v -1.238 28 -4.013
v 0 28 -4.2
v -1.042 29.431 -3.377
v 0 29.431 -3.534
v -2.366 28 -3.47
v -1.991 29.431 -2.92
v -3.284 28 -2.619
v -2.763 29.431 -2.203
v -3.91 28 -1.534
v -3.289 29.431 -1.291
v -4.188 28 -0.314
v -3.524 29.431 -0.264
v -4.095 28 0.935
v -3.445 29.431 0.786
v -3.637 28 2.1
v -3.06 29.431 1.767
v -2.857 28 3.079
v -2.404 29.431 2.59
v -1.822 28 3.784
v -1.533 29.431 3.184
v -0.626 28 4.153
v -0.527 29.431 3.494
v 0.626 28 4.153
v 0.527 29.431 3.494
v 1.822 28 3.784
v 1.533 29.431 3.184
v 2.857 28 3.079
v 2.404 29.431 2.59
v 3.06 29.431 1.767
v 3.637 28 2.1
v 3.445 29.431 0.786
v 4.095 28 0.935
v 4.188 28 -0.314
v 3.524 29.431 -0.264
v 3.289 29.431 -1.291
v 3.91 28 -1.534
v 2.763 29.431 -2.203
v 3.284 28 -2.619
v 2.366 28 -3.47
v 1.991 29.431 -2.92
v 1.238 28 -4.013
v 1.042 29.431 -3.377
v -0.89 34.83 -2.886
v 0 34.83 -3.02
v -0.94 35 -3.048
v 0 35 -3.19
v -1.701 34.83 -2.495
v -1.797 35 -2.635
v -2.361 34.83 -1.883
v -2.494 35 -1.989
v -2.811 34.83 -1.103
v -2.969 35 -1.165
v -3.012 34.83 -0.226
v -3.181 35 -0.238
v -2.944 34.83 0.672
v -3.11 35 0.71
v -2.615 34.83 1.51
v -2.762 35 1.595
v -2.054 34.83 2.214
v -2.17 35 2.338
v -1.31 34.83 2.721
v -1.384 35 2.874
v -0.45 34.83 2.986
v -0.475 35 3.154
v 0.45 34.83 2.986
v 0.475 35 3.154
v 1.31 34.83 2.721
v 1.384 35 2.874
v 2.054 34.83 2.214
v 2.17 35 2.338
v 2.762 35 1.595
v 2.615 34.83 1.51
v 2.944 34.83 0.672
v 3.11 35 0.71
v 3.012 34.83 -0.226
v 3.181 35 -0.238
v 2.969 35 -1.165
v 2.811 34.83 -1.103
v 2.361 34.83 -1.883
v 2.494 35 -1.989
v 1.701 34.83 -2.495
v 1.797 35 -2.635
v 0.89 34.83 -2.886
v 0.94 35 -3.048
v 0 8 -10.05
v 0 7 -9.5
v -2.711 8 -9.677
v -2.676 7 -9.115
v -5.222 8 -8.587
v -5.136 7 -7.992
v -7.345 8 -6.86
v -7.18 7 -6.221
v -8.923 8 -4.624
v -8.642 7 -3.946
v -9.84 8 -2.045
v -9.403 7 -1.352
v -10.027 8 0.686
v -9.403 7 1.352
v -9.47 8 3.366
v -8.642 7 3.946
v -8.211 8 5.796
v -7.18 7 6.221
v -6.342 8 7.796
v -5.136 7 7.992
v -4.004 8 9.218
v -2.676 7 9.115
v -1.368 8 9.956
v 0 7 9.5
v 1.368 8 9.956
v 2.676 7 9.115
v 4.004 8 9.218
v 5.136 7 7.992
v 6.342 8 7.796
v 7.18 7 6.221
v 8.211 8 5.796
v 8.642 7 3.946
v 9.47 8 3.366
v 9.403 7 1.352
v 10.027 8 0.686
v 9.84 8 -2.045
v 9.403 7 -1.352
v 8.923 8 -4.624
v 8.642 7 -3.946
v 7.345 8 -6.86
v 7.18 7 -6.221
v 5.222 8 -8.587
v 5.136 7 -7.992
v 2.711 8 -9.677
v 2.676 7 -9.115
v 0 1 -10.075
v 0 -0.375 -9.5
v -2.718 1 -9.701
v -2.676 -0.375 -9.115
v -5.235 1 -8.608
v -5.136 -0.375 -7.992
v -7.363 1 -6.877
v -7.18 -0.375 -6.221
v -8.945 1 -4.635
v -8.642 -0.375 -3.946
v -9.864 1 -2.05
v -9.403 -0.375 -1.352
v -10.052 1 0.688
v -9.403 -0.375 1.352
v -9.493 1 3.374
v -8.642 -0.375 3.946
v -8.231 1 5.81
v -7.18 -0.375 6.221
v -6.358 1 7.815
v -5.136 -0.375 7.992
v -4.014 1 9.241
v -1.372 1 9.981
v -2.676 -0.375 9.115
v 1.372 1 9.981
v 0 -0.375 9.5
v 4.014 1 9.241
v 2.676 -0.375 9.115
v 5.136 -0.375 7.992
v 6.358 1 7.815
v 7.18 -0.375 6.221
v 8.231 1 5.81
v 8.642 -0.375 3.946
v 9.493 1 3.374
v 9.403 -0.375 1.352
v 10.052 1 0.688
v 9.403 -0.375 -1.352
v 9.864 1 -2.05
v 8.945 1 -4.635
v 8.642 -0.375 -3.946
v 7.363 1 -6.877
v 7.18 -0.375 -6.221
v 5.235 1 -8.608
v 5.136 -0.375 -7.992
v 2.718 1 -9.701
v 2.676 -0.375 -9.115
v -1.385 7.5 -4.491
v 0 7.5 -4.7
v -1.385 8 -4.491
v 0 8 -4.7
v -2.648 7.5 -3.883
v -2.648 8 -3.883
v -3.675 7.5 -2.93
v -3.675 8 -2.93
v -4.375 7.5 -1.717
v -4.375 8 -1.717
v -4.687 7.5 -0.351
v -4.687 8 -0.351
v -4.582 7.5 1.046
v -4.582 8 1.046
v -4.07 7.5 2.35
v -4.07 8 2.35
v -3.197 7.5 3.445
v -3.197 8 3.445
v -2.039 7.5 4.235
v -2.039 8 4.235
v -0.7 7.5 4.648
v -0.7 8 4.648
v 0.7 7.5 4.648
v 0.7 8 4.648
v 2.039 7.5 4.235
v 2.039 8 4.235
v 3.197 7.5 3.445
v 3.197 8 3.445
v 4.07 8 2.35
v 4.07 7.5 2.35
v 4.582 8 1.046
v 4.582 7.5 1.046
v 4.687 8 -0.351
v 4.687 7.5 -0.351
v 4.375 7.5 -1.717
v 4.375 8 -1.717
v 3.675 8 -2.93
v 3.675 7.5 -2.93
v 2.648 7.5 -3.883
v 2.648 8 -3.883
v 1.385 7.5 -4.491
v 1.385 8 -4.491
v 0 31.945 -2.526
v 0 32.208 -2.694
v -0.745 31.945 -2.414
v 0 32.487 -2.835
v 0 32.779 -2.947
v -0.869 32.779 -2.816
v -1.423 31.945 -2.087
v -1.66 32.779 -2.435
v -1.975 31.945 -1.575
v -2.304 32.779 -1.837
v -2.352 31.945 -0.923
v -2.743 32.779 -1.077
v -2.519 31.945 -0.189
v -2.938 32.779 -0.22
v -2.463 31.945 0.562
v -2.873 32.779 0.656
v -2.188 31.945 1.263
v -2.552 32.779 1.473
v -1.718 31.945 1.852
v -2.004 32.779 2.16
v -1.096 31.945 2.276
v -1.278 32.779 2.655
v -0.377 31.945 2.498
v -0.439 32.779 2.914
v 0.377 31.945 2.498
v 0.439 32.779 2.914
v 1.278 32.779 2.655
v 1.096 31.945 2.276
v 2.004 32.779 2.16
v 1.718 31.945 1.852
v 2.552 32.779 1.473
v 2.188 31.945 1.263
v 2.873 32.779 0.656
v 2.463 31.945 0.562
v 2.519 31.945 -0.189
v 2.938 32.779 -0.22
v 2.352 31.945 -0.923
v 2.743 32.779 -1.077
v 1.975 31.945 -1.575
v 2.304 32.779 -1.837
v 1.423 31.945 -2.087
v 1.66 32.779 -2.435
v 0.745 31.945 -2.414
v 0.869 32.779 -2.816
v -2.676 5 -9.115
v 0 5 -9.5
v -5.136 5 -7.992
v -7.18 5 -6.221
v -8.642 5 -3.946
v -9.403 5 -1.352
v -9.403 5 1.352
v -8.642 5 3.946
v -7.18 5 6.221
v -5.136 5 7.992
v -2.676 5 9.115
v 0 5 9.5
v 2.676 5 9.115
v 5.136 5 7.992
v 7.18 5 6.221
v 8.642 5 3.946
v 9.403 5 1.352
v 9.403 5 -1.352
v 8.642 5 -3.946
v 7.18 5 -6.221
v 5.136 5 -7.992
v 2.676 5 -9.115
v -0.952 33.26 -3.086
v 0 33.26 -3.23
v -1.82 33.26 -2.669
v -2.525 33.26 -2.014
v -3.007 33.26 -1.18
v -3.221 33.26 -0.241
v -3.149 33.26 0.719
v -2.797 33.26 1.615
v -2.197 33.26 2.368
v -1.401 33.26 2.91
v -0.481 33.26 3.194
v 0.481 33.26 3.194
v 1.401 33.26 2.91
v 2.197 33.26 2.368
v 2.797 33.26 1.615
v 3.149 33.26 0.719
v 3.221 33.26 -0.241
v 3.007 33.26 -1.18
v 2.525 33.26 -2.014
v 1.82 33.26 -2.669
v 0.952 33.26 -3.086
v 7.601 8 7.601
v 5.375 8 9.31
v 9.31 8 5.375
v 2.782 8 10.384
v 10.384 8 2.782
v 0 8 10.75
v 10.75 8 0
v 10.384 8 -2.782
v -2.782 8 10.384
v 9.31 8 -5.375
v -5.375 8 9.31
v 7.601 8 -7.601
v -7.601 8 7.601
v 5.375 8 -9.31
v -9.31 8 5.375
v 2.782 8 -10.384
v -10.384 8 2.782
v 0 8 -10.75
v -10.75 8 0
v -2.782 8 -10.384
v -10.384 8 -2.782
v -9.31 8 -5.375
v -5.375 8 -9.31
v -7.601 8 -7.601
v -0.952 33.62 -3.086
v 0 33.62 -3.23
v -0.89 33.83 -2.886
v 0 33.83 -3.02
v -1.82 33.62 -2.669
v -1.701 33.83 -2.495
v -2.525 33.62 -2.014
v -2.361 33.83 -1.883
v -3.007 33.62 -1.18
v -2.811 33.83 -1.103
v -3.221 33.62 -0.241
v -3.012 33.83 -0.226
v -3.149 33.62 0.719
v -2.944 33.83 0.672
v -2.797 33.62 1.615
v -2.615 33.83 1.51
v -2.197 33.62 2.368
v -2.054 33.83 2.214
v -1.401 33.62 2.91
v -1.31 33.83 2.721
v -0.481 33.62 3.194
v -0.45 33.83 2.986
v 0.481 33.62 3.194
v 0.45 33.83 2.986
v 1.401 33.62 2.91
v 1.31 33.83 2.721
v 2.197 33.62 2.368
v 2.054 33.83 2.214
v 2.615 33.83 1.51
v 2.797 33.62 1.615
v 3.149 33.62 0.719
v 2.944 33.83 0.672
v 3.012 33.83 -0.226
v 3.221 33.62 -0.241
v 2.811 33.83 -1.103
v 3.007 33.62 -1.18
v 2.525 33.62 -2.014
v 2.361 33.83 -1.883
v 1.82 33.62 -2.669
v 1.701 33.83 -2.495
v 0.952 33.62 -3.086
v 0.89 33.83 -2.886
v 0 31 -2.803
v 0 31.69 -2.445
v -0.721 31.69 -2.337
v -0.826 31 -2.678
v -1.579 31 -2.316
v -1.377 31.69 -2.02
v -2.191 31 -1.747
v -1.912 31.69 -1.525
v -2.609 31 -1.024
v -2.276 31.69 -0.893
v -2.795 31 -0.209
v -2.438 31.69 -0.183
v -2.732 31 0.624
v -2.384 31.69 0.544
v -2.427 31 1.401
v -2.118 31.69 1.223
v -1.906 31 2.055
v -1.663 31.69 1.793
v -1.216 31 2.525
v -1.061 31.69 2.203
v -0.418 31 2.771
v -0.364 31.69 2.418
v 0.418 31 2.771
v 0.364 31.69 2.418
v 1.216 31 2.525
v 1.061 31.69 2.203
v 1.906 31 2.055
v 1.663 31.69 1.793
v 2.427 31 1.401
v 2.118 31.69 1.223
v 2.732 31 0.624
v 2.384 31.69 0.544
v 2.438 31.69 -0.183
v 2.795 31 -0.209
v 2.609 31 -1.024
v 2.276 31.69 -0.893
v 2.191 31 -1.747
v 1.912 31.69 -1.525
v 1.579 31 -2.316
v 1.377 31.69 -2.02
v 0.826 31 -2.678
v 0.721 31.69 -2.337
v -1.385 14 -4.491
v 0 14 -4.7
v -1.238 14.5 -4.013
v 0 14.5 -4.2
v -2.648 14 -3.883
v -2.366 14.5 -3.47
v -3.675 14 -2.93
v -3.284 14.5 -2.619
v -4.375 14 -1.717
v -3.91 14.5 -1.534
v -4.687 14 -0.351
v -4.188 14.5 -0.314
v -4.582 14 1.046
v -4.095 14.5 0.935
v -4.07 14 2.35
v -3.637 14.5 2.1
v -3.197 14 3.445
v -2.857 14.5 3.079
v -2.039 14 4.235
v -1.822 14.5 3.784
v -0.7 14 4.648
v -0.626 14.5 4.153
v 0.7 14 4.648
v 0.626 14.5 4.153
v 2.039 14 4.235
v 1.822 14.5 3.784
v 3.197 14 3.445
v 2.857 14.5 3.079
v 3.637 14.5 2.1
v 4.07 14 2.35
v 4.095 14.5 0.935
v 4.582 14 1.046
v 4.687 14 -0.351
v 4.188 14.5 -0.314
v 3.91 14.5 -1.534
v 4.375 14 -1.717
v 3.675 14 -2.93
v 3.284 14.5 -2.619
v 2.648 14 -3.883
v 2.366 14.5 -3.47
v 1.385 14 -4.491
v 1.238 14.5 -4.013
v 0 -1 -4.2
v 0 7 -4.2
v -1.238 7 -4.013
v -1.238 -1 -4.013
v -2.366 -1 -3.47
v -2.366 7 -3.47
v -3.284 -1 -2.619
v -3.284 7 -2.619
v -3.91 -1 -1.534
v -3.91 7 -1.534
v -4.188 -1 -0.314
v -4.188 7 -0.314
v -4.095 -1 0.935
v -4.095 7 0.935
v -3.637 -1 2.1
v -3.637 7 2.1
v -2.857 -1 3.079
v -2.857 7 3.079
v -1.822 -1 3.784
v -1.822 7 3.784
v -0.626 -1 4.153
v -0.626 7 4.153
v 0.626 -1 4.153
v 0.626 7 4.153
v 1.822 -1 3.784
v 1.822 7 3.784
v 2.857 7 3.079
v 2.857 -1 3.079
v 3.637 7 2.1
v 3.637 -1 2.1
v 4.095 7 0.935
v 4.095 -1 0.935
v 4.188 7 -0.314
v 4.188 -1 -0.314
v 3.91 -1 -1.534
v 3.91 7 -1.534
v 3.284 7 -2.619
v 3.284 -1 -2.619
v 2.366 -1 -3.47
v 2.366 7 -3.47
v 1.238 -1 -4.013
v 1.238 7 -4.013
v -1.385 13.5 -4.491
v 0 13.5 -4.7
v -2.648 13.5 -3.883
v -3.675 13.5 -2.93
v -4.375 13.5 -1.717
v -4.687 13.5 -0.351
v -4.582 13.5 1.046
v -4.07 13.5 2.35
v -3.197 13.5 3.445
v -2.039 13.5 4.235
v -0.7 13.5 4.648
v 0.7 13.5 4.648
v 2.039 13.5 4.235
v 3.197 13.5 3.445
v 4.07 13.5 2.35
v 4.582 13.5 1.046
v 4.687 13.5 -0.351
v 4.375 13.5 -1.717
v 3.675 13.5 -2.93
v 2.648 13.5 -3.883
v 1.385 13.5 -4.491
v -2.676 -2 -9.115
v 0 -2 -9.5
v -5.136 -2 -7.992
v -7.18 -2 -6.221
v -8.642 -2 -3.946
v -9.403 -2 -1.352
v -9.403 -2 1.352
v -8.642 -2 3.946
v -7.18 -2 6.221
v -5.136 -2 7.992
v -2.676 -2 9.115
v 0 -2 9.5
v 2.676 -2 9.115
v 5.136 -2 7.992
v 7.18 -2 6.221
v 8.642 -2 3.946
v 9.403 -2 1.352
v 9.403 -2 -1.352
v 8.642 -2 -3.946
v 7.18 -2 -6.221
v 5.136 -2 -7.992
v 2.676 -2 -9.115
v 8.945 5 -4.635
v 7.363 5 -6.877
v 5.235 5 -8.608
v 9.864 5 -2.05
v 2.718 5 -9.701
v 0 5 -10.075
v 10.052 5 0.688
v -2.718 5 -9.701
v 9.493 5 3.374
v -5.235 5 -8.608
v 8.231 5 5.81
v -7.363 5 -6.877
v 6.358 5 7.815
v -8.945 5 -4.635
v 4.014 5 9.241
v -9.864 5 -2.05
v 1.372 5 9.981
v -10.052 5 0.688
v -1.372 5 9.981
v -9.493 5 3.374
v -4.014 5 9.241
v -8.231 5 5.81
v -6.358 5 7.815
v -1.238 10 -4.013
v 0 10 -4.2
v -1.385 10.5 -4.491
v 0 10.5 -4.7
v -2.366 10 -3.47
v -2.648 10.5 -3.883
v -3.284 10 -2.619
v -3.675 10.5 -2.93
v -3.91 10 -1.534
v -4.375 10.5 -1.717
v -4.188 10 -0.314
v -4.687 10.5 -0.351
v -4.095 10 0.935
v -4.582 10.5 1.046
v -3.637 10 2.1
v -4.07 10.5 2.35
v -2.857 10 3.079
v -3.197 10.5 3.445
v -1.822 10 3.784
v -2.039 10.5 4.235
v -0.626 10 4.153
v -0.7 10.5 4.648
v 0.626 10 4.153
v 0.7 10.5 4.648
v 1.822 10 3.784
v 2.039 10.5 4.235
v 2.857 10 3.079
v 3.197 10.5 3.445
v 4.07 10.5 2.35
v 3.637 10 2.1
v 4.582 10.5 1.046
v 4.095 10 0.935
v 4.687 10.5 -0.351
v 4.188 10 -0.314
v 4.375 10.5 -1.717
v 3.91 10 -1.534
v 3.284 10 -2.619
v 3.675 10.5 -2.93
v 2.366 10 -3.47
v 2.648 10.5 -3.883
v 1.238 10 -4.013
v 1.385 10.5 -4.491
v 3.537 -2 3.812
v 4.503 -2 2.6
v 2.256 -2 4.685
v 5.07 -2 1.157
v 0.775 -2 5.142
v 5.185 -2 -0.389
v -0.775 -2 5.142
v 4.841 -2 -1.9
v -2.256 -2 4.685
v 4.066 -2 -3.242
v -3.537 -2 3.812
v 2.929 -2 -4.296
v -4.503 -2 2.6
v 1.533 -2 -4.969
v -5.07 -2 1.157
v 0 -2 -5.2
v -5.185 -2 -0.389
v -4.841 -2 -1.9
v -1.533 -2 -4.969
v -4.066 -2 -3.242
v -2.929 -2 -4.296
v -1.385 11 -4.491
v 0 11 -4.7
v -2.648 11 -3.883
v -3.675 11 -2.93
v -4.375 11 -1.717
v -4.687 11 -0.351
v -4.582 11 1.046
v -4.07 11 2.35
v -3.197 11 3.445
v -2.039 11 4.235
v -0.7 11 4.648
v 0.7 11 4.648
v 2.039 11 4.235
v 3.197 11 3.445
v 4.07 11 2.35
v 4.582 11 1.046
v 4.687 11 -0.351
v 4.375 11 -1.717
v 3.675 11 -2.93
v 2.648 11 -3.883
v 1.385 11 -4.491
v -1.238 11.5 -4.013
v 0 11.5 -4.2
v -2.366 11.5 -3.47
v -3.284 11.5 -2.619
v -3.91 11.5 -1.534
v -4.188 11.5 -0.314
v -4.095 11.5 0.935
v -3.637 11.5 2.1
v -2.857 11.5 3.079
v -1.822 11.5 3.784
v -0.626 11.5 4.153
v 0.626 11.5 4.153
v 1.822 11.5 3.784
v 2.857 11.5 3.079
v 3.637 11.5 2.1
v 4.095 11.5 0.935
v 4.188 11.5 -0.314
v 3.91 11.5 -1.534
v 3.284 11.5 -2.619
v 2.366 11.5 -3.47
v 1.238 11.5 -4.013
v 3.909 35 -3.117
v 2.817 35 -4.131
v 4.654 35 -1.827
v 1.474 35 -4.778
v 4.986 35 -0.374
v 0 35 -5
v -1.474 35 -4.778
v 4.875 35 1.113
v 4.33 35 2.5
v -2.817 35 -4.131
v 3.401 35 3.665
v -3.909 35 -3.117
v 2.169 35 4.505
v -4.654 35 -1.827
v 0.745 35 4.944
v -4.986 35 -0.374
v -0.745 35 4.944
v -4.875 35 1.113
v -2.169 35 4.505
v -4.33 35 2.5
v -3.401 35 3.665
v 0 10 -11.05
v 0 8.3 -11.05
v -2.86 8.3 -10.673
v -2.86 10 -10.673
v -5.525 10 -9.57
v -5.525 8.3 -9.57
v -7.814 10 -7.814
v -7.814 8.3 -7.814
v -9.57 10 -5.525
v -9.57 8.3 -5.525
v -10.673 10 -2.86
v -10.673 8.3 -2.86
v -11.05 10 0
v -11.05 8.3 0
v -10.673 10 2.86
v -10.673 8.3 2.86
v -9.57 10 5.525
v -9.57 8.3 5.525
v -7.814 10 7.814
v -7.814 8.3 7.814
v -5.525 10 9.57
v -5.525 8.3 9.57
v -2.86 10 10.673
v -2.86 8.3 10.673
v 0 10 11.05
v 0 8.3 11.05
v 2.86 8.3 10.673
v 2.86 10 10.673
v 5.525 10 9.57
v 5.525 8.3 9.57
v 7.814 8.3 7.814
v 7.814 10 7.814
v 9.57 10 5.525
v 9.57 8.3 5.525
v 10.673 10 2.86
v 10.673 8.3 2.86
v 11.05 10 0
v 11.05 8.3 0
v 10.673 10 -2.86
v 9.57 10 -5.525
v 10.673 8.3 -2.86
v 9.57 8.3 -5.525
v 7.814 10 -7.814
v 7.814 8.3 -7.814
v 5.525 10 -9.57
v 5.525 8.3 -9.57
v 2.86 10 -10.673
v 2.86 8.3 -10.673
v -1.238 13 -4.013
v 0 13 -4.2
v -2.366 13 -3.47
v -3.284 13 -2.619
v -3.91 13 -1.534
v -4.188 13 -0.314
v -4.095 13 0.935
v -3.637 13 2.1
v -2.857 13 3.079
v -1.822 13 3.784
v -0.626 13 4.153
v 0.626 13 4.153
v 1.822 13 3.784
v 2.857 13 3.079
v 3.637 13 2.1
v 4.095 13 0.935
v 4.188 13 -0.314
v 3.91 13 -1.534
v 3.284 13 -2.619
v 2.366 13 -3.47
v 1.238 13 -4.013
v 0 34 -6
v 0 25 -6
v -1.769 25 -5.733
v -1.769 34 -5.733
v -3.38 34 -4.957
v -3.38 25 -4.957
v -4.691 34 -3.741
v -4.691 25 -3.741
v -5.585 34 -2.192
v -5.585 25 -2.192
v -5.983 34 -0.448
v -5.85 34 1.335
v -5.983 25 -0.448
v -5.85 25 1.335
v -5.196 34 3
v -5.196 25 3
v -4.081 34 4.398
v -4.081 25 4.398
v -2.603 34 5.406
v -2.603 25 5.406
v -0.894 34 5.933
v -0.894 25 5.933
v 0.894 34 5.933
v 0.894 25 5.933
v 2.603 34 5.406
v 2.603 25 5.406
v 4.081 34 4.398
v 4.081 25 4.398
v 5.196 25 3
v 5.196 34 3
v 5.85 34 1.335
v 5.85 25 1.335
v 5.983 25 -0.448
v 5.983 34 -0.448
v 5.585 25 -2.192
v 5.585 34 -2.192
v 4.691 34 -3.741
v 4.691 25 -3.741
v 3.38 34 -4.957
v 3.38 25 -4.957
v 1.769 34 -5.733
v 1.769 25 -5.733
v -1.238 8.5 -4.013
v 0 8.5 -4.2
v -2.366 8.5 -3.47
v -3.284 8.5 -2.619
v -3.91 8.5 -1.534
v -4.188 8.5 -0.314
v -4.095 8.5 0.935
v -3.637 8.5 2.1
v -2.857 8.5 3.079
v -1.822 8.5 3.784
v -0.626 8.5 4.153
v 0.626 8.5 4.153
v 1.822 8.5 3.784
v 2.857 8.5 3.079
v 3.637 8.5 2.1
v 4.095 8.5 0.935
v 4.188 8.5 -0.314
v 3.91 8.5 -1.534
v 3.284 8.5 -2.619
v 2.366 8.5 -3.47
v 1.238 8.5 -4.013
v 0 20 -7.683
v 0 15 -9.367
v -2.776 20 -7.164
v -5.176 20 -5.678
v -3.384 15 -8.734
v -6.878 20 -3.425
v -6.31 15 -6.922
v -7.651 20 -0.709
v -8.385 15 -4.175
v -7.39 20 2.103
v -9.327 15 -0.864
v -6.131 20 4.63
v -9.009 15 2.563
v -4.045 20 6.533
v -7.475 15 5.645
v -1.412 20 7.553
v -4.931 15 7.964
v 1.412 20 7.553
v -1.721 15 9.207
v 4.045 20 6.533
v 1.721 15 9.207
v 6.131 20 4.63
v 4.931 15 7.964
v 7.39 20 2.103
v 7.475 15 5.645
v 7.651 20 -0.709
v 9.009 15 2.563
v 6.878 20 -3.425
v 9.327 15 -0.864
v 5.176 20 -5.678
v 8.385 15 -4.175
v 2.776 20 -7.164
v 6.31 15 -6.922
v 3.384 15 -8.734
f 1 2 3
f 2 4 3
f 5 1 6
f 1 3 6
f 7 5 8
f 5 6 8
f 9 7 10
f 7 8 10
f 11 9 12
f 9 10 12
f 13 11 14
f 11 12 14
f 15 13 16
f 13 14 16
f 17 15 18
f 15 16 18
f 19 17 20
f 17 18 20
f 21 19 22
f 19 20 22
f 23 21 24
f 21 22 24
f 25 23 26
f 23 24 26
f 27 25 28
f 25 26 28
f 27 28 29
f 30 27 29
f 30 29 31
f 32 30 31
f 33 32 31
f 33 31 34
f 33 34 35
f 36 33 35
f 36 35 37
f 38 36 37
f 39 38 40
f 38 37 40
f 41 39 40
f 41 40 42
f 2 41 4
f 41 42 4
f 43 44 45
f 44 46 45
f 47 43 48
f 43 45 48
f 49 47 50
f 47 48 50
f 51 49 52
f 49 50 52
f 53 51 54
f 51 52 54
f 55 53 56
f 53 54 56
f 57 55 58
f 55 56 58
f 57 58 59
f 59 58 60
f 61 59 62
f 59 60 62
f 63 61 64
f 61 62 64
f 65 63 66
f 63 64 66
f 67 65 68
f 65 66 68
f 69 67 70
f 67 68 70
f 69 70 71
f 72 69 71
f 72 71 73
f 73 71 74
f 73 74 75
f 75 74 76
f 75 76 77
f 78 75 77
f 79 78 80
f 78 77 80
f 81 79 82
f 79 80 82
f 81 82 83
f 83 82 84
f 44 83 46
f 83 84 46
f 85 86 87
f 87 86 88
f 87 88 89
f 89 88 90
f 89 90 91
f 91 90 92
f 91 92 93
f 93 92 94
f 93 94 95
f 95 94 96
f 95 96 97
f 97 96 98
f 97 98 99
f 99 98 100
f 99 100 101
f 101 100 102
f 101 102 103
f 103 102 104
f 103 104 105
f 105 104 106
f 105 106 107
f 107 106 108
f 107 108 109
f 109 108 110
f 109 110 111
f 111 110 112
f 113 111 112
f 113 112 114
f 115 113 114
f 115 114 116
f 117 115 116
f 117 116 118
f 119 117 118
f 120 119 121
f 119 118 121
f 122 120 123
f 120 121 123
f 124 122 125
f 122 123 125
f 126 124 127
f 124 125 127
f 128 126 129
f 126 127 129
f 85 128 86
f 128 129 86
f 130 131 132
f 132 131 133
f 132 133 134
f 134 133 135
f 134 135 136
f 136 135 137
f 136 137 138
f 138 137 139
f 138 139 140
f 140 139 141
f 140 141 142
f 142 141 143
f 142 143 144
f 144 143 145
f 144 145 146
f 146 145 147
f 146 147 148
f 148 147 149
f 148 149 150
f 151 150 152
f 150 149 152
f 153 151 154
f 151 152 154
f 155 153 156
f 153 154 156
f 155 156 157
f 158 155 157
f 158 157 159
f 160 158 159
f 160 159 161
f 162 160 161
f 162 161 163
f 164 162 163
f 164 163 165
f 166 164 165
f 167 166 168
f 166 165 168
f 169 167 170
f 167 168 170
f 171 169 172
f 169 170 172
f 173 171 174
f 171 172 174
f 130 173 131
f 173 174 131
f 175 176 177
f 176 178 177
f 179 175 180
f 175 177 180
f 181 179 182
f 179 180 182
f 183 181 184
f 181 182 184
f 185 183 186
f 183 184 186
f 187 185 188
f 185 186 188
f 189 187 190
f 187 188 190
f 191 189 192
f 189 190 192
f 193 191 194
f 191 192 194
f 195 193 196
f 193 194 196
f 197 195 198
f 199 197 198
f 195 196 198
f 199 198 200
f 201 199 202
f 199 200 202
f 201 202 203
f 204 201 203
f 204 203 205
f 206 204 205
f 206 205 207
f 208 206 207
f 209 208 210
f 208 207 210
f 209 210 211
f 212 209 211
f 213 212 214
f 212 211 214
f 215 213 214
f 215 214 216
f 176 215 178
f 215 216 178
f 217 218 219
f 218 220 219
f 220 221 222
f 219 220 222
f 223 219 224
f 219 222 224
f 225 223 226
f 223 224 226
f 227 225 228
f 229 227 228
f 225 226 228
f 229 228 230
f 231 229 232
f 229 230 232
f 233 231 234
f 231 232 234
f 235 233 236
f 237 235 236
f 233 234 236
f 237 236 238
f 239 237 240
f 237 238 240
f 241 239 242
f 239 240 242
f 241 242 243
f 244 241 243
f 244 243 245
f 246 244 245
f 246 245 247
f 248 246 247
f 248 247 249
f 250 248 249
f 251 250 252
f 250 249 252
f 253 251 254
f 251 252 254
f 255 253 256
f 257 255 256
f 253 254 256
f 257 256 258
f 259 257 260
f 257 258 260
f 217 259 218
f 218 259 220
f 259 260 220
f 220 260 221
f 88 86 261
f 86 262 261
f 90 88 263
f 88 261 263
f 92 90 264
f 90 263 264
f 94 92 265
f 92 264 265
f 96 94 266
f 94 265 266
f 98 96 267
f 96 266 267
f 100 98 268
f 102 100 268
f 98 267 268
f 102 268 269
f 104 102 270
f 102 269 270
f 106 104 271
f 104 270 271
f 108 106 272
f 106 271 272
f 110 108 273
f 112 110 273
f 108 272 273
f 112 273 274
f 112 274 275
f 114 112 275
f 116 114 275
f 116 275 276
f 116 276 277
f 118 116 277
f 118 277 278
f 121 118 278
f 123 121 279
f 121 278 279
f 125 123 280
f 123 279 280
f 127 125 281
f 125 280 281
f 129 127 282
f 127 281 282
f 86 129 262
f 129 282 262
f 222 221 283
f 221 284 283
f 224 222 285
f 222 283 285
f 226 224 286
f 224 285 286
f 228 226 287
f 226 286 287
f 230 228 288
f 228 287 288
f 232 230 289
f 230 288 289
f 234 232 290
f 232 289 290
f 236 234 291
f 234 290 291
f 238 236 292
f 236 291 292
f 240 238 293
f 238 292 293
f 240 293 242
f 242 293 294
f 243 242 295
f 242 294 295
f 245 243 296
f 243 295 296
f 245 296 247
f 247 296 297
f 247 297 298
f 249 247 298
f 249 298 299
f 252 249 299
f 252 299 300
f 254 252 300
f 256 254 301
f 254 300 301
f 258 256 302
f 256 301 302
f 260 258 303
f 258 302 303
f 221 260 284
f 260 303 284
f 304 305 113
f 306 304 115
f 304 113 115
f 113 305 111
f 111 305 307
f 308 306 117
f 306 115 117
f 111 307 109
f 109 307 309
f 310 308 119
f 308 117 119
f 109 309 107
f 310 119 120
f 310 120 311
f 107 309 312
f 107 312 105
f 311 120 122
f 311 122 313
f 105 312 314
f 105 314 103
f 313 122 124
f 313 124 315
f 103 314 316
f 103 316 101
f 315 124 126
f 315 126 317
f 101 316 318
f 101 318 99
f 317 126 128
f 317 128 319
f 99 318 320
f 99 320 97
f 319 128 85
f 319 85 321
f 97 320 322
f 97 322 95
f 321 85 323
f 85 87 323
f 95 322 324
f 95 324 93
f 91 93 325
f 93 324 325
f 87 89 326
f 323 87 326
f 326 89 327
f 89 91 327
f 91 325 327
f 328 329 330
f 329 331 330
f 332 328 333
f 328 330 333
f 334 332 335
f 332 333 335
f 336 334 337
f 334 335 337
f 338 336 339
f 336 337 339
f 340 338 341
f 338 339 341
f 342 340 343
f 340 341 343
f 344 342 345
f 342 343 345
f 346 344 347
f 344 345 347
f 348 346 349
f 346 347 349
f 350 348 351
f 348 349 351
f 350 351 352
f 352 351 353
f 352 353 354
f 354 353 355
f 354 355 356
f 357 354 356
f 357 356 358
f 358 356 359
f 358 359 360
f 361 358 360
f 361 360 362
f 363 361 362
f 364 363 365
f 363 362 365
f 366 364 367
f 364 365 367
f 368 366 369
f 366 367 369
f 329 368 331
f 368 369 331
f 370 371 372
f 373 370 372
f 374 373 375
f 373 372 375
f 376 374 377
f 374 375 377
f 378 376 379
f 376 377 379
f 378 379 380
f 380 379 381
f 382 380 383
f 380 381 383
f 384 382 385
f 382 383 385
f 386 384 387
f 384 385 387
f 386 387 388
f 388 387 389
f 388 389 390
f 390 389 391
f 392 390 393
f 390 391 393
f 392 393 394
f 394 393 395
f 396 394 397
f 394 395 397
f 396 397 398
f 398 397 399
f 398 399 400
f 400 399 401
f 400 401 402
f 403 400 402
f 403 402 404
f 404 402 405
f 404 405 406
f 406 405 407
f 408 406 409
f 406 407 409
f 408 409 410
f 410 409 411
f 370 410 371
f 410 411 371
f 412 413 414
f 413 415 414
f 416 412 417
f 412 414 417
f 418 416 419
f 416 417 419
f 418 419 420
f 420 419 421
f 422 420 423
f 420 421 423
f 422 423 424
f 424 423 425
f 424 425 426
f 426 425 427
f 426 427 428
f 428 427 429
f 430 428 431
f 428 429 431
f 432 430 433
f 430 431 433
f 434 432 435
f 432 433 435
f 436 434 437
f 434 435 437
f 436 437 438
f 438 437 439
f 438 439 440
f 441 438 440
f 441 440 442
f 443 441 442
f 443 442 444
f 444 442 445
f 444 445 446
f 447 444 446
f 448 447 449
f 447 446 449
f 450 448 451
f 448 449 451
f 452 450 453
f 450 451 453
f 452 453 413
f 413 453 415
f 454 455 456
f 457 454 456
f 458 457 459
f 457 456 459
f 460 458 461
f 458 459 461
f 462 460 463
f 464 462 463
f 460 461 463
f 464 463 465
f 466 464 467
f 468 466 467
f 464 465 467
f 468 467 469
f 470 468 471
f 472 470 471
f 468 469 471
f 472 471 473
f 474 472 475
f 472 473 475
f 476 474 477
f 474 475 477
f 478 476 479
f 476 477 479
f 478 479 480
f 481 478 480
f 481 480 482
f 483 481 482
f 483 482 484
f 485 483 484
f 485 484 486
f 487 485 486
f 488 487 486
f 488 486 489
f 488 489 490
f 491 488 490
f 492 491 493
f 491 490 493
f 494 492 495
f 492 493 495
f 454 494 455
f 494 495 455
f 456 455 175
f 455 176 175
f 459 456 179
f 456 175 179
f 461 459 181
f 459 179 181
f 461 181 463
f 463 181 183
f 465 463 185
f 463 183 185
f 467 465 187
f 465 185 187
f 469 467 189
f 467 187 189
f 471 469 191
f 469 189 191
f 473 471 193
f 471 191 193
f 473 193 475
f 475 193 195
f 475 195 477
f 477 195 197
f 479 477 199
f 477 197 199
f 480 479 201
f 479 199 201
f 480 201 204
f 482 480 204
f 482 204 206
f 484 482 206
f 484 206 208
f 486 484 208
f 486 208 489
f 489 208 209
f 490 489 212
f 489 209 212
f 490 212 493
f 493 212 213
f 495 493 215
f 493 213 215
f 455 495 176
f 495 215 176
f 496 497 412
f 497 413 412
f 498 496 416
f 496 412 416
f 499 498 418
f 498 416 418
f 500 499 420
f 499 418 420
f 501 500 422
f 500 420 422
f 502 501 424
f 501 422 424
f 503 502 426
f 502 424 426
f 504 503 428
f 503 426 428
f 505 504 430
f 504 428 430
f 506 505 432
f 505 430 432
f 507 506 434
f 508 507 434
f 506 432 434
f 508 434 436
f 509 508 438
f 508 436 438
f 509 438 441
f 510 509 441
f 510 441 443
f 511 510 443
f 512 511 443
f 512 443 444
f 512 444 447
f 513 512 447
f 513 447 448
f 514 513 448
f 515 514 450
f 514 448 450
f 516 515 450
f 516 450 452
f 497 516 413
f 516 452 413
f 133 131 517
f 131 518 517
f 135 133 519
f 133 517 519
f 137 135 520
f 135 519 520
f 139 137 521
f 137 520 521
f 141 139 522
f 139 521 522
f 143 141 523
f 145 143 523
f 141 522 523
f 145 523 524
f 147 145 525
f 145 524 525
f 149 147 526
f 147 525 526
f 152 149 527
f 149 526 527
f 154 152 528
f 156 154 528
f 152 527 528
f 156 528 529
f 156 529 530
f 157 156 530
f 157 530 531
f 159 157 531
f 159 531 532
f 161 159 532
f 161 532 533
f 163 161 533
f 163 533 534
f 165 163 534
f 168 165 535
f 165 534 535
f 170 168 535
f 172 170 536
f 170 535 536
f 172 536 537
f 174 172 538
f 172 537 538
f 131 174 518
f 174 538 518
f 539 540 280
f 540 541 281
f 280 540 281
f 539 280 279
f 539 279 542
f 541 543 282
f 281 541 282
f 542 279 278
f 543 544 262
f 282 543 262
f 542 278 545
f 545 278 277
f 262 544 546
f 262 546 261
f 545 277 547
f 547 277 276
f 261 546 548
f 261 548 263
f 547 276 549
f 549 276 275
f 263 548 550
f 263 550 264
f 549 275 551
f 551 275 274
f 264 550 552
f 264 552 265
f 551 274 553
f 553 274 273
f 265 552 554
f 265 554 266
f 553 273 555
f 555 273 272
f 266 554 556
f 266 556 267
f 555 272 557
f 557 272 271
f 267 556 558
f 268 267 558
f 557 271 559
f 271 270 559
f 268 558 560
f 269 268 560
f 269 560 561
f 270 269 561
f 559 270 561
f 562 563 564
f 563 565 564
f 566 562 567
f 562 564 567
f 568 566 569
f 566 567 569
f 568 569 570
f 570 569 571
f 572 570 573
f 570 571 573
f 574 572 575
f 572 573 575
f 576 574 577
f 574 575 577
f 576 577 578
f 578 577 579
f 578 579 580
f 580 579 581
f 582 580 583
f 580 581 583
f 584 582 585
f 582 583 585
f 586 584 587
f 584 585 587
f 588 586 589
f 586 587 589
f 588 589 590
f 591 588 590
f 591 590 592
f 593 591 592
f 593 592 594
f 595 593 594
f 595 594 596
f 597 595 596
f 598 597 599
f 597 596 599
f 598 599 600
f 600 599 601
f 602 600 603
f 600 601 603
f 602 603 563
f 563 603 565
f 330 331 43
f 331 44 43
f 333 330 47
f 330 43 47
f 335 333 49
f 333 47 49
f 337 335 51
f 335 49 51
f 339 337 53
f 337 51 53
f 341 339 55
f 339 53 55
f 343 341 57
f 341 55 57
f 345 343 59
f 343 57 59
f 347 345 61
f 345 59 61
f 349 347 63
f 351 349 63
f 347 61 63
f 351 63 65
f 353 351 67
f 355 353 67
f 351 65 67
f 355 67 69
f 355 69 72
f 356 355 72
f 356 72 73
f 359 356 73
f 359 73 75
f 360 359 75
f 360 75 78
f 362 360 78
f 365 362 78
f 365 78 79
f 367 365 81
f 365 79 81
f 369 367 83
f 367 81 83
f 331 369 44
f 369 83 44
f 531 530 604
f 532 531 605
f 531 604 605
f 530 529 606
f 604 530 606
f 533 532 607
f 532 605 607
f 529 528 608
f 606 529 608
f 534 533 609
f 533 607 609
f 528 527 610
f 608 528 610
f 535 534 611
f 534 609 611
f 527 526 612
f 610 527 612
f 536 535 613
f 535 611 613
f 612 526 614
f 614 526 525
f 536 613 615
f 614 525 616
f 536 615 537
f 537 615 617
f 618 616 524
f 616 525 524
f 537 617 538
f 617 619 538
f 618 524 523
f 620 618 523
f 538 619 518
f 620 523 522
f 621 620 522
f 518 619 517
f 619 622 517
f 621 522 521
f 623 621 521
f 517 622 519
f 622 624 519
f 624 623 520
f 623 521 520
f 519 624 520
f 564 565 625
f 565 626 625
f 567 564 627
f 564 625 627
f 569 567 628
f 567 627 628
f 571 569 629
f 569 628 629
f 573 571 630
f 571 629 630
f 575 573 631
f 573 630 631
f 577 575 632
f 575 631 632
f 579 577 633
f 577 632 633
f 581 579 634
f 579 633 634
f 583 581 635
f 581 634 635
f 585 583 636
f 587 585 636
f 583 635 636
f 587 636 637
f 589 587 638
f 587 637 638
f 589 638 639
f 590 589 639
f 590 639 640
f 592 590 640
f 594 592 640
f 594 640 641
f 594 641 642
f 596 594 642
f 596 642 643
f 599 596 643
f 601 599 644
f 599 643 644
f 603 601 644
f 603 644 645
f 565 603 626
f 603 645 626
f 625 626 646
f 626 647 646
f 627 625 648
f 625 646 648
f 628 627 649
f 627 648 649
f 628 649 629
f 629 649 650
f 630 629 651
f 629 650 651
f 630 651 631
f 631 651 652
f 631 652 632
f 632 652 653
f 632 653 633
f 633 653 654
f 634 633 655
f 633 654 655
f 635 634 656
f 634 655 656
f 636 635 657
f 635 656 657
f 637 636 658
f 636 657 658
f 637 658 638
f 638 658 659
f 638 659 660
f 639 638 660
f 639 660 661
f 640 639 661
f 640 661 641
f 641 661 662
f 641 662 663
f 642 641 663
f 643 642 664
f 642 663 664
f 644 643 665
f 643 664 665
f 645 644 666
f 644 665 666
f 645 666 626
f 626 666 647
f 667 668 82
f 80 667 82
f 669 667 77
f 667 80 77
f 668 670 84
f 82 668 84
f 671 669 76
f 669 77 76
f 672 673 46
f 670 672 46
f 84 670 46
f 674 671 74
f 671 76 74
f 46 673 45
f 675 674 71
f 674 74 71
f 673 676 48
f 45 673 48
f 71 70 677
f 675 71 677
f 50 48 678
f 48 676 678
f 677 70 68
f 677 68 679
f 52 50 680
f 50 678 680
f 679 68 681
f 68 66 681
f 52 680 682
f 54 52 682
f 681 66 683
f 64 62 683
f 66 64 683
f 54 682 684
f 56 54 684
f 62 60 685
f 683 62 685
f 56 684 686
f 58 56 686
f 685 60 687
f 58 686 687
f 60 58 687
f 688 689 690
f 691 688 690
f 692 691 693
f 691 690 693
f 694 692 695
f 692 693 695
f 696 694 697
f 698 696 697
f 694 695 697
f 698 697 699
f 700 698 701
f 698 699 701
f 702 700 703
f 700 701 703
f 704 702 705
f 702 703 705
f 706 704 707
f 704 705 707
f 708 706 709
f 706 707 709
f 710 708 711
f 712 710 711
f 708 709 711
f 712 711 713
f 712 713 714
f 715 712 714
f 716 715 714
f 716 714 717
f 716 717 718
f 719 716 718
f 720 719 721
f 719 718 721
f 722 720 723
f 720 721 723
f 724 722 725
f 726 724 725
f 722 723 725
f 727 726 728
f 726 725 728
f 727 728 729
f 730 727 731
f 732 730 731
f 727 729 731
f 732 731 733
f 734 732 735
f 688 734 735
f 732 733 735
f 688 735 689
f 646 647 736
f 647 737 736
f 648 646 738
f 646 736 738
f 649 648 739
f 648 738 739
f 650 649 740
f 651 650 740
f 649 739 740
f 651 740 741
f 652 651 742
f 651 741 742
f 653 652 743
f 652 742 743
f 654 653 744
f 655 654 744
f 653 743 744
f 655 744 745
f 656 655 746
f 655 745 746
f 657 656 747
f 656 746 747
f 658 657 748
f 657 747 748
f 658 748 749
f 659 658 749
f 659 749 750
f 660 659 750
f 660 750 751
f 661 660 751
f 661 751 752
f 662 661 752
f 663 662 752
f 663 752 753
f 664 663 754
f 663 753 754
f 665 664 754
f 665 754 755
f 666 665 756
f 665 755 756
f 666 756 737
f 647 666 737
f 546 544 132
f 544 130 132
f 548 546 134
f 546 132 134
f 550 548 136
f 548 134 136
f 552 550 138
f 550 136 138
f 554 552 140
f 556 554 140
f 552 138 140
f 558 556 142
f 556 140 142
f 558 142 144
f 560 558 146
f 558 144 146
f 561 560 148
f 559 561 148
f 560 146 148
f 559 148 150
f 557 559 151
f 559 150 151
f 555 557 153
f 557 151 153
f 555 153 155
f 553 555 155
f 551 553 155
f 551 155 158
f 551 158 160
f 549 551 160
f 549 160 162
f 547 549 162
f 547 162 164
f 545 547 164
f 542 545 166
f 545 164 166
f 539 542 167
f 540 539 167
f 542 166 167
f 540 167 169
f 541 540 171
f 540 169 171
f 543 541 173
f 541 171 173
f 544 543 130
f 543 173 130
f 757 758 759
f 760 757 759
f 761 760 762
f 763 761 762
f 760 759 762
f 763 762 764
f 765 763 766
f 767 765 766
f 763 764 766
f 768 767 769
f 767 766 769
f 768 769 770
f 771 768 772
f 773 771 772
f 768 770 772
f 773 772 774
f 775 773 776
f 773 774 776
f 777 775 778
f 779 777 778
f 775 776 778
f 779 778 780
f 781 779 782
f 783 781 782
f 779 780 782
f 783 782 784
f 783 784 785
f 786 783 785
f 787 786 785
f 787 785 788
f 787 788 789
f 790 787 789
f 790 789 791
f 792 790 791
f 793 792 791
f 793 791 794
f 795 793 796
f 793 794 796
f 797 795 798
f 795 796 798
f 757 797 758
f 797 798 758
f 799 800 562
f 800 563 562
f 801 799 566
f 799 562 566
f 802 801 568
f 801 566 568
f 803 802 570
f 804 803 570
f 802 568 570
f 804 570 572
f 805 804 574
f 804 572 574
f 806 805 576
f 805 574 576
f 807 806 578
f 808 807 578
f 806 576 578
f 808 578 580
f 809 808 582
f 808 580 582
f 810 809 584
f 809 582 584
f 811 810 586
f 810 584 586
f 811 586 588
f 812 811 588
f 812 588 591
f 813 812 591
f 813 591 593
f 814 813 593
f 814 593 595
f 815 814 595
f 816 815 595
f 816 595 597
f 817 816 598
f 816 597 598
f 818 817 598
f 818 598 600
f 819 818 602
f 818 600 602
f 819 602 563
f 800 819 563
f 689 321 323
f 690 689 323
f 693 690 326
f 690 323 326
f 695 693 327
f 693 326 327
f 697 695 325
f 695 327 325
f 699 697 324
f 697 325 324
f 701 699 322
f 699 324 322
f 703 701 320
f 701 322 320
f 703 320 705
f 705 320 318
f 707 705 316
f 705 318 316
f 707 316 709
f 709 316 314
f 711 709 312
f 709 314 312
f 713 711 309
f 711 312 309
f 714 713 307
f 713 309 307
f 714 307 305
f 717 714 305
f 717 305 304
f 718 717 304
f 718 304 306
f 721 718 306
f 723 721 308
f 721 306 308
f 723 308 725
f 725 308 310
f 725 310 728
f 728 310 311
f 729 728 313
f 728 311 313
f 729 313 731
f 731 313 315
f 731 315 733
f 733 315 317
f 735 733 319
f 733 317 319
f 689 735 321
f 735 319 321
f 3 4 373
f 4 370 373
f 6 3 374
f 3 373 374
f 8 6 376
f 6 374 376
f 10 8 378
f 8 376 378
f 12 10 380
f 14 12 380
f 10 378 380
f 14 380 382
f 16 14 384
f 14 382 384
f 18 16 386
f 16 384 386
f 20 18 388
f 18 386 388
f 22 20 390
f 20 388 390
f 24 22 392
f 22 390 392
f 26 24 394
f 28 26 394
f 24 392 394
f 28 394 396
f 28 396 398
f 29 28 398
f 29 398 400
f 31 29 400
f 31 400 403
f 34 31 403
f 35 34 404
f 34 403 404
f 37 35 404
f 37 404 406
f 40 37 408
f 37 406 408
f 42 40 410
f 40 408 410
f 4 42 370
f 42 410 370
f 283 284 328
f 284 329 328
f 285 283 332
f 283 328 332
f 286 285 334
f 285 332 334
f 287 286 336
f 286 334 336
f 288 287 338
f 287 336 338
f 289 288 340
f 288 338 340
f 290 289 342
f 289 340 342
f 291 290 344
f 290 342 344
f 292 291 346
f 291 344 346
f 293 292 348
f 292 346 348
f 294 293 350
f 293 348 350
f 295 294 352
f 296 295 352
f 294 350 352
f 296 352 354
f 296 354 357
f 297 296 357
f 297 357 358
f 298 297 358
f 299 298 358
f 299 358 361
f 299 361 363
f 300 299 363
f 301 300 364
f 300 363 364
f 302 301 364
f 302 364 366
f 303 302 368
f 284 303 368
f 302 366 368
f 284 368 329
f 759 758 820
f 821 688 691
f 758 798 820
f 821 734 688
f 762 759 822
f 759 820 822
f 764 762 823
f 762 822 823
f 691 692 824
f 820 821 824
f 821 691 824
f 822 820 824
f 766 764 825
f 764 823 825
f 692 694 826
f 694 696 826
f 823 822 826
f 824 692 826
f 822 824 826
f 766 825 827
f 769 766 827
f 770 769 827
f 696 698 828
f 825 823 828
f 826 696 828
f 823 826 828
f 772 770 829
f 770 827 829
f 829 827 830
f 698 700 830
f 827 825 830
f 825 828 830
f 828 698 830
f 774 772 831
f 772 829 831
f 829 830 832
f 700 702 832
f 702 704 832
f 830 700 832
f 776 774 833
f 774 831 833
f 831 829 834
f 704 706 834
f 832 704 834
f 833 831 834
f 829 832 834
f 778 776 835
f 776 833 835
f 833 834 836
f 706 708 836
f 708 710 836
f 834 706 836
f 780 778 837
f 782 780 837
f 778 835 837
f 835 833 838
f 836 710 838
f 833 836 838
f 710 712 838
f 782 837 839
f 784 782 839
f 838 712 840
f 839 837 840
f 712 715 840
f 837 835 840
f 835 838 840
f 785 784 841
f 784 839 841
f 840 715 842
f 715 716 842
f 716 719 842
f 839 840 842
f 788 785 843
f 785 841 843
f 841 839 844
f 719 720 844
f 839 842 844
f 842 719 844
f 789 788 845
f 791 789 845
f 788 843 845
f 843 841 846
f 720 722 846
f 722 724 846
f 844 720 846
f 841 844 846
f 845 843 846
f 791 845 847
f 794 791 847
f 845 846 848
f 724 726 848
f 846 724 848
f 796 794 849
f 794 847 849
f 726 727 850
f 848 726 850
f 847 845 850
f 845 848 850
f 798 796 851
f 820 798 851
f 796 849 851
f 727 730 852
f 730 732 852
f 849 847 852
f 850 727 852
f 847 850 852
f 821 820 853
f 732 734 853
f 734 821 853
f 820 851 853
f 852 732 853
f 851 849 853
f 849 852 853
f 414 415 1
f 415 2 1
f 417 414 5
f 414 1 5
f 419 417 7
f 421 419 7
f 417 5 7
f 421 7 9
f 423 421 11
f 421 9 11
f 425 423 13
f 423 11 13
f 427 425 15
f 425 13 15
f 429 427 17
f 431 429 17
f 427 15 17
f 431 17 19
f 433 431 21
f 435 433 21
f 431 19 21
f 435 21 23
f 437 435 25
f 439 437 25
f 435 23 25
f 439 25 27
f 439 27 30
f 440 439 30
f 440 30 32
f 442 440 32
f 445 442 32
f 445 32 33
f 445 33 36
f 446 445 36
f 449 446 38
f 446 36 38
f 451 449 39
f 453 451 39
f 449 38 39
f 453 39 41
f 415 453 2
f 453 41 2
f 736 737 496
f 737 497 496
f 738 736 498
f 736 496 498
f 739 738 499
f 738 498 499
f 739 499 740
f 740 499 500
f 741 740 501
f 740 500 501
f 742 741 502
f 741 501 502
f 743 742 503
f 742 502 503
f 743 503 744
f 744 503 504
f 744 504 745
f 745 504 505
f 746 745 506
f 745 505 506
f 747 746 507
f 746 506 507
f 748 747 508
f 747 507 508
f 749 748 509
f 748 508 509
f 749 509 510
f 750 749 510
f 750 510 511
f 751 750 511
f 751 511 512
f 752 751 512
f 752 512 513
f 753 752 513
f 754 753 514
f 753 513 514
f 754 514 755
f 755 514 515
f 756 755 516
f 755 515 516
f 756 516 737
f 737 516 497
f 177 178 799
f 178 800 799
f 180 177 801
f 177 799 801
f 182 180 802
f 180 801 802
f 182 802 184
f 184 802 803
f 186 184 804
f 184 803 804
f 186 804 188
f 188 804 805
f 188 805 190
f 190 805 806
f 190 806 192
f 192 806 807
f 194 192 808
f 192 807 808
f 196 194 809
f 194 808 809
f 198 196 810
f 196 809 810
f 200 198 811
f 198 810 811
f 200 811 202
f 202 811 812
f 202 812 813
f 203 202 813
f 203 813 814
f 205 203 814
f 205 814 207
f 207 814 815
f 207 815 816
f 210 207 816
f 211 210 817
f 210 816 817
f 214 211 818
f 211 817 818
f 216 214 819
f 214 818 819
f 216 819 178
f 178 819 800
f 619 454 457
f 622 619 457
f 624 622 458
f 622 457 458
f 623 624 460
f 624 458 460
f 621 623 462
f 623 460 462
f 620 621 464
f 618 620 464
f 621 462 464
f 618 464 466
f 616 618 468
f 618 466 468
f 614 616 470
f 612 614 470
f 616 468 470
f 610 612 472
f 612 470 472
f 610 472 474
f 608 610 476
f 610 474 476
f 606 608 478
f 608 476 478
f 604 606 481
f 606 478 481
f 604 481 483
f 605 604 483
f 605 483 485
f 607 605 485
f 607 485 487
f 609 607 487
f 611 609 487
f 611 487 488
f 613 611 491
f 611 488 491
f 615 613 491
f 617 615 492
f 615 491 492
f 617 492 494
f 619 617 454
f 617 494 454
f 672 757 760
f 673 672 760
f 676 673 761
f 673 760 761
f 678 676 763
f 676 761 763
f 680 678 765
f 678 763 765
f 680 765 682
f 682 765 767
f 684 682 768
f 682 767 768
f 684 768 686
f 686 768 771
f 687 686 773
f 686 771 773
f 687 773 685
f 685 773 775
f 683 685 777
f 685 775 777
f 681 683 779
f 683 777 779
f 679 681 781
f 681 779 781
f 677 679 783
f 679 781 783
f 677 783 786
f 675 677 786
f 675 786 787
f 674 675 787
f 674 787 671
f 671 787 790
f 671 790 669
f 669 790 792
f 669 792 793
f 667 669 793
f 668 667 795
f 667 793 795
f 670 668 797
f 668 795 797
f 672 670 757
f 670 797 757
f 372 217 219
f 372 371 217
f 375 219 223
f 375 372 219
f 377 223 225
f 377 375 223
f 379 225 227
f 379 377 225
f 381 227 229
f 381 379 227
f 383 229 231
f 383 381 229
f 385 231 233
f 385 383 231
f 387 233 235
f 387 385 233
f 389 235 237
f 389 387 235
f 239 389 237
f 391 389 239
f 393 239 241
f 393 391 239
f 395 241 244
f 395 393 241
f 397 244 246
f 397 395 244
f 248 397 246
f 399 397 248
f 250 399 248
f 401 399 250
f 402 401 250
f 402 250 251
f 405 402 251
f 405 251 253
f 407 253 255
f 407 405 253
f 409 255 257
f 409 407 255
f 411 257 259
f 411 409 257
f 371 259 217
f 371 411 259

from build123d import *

# Parameters (mm, degrees)
CHAMFER_1_SIZE = 1
CHAMFER_2_SIZE = 0.1
CHAMFER_3_SIZE = 0.3


with BuildPart() as part:
    # 스케치1 → 회전1 (revolve)
    with BuildSketch(Plane(origin=(0, 0, 0), x_dir=(0, 0, -1), z_dir=(1, 0, 0))):
        with BuildLine():
            Line((4.2, 0), (4.2, 1))
            Line((4.2, 1), (4.2, 7))
            Line((4.2, 7), (4.7, 7.500000078))
            Line((4.7, 7.500000078), (4.7, 8.000000078))
            Line((4.7, 8.000000078), (4.2, 8.5))
            Line((4.2, 8.5), (4.2, 10))
            Line((4.2, 10), (4.7, 10.500000078))
            Line((4.7, 10.500000078), (4.7, 11.000000078))
            Line((4.7, 11.000000078), (4.2, 11.5))
            Line((4.2, 11.5), (4.2, 13))
            Line((4.2, 13), (4.7, 13.500000078))
            Line((4.7, 13.500000078), (4.7, 14.000000078))
            Line((4.7, 14.000000078), (4.2, 14.5))
            Line((4.2, 14.5), (4.2, 28))
            Line((4.2, 28), (3.533728258, 29.430530536))
            Line((3.533728258, 29.430530536), (2.802745502, 31))
            Line((2.802745502, 31), (2.399244734, 31.778552392))
            ThreePointArc((2.399244734, 31.778552392), (2.719290067, 32.253174869), (2.946609162, 32.778552392))
            Line((2.946609162, 32.778552392), (3.229990685, 33.260397004))
            Line((3.229990685, 33.260397004), (3.229990685, 33.62037773))
            Line((3.229990685, 33.62037773), (3.02, 33.830368416))
            Line((3.02, 33.830368416), (3.02, 34.830368416))
            Line((3.02, 34.830368416), (3.189631584, 35))
            Line((3.189631584, 35), (6, 35))
            Line((6, 35), (6, 25))
            Line((6, 25), (11.05, 10))
            Line((11.05, 10), (11.05, 8))
            Line((11.05, 8), (10.05, 8))
            Line((10.05, 8), (9.5, 7))
            Line((9.5, 7), (9.5, 5))
            Line((9.5, 5), (10.075, 5))
            Line((10.075, 5), (10.075, 1))
            Line((10.075, 1), (9.5, -0.374573668))
            Line((9.5, -0.374573668), (9.5, -2))
            Line((9.5, -2), (4.2, -2))
            Line((4.2, -2), (4.2, 0))
        make_face()
    revolve(axis=Axis((0, 0, 0), (0, 1, 0)))

    # 모따기1
    chamfer_1_edges = [part.edges().sort_by_distance(p)[0] for p in [
        (0, 35, 6),
        (0, -2, 4.2),
    ]]
    chamfer(chamfer_1_edges, length=CHAMFER_1_SIZE)

    # 모따기2
    # the kernel refuses this chamfer: 0.191354542, 0.1 mm, written as the material it takes off along each edge
    with BuildSketch(Plane(origin=(0, 31.778552392, 0), x_dir=(0, 0, -1), z_dir=(1, 0, 0))) as chamfer_2_piece_1:
        with BuildLine():
            Line((2.52619809, 0.166311611), (2.399244734 + CHAMFER_2_SIZE * 0.460143640426, -CHAMFER_2_SIZE * 0.887844485355))
            Line((2.399244734 + CHAMFER_2_SIZE * 0.460143640426, -CHAMFER_2_SIZE * 0.887844485355), (2.399244734, 0))
            ThreePointArc((2.399244734, 0), (2.466310937, 0.08495162), (2.52619809, 0.166311611))
        make_face()
    revolve(axis=Axis((0, 31.778552392, 0), (0, 1, 0)), mode=Mode.SUBTRACT)

    # 모따기3
    chamfer_3_edges = [part.edges().sort_by_distance(p)[0] for p in [
        (0, 8, 11.05),
    ]]
    chamfer(chamfer_3_edges, length=CHAMFER_3_SIZE)


solid = part.part
